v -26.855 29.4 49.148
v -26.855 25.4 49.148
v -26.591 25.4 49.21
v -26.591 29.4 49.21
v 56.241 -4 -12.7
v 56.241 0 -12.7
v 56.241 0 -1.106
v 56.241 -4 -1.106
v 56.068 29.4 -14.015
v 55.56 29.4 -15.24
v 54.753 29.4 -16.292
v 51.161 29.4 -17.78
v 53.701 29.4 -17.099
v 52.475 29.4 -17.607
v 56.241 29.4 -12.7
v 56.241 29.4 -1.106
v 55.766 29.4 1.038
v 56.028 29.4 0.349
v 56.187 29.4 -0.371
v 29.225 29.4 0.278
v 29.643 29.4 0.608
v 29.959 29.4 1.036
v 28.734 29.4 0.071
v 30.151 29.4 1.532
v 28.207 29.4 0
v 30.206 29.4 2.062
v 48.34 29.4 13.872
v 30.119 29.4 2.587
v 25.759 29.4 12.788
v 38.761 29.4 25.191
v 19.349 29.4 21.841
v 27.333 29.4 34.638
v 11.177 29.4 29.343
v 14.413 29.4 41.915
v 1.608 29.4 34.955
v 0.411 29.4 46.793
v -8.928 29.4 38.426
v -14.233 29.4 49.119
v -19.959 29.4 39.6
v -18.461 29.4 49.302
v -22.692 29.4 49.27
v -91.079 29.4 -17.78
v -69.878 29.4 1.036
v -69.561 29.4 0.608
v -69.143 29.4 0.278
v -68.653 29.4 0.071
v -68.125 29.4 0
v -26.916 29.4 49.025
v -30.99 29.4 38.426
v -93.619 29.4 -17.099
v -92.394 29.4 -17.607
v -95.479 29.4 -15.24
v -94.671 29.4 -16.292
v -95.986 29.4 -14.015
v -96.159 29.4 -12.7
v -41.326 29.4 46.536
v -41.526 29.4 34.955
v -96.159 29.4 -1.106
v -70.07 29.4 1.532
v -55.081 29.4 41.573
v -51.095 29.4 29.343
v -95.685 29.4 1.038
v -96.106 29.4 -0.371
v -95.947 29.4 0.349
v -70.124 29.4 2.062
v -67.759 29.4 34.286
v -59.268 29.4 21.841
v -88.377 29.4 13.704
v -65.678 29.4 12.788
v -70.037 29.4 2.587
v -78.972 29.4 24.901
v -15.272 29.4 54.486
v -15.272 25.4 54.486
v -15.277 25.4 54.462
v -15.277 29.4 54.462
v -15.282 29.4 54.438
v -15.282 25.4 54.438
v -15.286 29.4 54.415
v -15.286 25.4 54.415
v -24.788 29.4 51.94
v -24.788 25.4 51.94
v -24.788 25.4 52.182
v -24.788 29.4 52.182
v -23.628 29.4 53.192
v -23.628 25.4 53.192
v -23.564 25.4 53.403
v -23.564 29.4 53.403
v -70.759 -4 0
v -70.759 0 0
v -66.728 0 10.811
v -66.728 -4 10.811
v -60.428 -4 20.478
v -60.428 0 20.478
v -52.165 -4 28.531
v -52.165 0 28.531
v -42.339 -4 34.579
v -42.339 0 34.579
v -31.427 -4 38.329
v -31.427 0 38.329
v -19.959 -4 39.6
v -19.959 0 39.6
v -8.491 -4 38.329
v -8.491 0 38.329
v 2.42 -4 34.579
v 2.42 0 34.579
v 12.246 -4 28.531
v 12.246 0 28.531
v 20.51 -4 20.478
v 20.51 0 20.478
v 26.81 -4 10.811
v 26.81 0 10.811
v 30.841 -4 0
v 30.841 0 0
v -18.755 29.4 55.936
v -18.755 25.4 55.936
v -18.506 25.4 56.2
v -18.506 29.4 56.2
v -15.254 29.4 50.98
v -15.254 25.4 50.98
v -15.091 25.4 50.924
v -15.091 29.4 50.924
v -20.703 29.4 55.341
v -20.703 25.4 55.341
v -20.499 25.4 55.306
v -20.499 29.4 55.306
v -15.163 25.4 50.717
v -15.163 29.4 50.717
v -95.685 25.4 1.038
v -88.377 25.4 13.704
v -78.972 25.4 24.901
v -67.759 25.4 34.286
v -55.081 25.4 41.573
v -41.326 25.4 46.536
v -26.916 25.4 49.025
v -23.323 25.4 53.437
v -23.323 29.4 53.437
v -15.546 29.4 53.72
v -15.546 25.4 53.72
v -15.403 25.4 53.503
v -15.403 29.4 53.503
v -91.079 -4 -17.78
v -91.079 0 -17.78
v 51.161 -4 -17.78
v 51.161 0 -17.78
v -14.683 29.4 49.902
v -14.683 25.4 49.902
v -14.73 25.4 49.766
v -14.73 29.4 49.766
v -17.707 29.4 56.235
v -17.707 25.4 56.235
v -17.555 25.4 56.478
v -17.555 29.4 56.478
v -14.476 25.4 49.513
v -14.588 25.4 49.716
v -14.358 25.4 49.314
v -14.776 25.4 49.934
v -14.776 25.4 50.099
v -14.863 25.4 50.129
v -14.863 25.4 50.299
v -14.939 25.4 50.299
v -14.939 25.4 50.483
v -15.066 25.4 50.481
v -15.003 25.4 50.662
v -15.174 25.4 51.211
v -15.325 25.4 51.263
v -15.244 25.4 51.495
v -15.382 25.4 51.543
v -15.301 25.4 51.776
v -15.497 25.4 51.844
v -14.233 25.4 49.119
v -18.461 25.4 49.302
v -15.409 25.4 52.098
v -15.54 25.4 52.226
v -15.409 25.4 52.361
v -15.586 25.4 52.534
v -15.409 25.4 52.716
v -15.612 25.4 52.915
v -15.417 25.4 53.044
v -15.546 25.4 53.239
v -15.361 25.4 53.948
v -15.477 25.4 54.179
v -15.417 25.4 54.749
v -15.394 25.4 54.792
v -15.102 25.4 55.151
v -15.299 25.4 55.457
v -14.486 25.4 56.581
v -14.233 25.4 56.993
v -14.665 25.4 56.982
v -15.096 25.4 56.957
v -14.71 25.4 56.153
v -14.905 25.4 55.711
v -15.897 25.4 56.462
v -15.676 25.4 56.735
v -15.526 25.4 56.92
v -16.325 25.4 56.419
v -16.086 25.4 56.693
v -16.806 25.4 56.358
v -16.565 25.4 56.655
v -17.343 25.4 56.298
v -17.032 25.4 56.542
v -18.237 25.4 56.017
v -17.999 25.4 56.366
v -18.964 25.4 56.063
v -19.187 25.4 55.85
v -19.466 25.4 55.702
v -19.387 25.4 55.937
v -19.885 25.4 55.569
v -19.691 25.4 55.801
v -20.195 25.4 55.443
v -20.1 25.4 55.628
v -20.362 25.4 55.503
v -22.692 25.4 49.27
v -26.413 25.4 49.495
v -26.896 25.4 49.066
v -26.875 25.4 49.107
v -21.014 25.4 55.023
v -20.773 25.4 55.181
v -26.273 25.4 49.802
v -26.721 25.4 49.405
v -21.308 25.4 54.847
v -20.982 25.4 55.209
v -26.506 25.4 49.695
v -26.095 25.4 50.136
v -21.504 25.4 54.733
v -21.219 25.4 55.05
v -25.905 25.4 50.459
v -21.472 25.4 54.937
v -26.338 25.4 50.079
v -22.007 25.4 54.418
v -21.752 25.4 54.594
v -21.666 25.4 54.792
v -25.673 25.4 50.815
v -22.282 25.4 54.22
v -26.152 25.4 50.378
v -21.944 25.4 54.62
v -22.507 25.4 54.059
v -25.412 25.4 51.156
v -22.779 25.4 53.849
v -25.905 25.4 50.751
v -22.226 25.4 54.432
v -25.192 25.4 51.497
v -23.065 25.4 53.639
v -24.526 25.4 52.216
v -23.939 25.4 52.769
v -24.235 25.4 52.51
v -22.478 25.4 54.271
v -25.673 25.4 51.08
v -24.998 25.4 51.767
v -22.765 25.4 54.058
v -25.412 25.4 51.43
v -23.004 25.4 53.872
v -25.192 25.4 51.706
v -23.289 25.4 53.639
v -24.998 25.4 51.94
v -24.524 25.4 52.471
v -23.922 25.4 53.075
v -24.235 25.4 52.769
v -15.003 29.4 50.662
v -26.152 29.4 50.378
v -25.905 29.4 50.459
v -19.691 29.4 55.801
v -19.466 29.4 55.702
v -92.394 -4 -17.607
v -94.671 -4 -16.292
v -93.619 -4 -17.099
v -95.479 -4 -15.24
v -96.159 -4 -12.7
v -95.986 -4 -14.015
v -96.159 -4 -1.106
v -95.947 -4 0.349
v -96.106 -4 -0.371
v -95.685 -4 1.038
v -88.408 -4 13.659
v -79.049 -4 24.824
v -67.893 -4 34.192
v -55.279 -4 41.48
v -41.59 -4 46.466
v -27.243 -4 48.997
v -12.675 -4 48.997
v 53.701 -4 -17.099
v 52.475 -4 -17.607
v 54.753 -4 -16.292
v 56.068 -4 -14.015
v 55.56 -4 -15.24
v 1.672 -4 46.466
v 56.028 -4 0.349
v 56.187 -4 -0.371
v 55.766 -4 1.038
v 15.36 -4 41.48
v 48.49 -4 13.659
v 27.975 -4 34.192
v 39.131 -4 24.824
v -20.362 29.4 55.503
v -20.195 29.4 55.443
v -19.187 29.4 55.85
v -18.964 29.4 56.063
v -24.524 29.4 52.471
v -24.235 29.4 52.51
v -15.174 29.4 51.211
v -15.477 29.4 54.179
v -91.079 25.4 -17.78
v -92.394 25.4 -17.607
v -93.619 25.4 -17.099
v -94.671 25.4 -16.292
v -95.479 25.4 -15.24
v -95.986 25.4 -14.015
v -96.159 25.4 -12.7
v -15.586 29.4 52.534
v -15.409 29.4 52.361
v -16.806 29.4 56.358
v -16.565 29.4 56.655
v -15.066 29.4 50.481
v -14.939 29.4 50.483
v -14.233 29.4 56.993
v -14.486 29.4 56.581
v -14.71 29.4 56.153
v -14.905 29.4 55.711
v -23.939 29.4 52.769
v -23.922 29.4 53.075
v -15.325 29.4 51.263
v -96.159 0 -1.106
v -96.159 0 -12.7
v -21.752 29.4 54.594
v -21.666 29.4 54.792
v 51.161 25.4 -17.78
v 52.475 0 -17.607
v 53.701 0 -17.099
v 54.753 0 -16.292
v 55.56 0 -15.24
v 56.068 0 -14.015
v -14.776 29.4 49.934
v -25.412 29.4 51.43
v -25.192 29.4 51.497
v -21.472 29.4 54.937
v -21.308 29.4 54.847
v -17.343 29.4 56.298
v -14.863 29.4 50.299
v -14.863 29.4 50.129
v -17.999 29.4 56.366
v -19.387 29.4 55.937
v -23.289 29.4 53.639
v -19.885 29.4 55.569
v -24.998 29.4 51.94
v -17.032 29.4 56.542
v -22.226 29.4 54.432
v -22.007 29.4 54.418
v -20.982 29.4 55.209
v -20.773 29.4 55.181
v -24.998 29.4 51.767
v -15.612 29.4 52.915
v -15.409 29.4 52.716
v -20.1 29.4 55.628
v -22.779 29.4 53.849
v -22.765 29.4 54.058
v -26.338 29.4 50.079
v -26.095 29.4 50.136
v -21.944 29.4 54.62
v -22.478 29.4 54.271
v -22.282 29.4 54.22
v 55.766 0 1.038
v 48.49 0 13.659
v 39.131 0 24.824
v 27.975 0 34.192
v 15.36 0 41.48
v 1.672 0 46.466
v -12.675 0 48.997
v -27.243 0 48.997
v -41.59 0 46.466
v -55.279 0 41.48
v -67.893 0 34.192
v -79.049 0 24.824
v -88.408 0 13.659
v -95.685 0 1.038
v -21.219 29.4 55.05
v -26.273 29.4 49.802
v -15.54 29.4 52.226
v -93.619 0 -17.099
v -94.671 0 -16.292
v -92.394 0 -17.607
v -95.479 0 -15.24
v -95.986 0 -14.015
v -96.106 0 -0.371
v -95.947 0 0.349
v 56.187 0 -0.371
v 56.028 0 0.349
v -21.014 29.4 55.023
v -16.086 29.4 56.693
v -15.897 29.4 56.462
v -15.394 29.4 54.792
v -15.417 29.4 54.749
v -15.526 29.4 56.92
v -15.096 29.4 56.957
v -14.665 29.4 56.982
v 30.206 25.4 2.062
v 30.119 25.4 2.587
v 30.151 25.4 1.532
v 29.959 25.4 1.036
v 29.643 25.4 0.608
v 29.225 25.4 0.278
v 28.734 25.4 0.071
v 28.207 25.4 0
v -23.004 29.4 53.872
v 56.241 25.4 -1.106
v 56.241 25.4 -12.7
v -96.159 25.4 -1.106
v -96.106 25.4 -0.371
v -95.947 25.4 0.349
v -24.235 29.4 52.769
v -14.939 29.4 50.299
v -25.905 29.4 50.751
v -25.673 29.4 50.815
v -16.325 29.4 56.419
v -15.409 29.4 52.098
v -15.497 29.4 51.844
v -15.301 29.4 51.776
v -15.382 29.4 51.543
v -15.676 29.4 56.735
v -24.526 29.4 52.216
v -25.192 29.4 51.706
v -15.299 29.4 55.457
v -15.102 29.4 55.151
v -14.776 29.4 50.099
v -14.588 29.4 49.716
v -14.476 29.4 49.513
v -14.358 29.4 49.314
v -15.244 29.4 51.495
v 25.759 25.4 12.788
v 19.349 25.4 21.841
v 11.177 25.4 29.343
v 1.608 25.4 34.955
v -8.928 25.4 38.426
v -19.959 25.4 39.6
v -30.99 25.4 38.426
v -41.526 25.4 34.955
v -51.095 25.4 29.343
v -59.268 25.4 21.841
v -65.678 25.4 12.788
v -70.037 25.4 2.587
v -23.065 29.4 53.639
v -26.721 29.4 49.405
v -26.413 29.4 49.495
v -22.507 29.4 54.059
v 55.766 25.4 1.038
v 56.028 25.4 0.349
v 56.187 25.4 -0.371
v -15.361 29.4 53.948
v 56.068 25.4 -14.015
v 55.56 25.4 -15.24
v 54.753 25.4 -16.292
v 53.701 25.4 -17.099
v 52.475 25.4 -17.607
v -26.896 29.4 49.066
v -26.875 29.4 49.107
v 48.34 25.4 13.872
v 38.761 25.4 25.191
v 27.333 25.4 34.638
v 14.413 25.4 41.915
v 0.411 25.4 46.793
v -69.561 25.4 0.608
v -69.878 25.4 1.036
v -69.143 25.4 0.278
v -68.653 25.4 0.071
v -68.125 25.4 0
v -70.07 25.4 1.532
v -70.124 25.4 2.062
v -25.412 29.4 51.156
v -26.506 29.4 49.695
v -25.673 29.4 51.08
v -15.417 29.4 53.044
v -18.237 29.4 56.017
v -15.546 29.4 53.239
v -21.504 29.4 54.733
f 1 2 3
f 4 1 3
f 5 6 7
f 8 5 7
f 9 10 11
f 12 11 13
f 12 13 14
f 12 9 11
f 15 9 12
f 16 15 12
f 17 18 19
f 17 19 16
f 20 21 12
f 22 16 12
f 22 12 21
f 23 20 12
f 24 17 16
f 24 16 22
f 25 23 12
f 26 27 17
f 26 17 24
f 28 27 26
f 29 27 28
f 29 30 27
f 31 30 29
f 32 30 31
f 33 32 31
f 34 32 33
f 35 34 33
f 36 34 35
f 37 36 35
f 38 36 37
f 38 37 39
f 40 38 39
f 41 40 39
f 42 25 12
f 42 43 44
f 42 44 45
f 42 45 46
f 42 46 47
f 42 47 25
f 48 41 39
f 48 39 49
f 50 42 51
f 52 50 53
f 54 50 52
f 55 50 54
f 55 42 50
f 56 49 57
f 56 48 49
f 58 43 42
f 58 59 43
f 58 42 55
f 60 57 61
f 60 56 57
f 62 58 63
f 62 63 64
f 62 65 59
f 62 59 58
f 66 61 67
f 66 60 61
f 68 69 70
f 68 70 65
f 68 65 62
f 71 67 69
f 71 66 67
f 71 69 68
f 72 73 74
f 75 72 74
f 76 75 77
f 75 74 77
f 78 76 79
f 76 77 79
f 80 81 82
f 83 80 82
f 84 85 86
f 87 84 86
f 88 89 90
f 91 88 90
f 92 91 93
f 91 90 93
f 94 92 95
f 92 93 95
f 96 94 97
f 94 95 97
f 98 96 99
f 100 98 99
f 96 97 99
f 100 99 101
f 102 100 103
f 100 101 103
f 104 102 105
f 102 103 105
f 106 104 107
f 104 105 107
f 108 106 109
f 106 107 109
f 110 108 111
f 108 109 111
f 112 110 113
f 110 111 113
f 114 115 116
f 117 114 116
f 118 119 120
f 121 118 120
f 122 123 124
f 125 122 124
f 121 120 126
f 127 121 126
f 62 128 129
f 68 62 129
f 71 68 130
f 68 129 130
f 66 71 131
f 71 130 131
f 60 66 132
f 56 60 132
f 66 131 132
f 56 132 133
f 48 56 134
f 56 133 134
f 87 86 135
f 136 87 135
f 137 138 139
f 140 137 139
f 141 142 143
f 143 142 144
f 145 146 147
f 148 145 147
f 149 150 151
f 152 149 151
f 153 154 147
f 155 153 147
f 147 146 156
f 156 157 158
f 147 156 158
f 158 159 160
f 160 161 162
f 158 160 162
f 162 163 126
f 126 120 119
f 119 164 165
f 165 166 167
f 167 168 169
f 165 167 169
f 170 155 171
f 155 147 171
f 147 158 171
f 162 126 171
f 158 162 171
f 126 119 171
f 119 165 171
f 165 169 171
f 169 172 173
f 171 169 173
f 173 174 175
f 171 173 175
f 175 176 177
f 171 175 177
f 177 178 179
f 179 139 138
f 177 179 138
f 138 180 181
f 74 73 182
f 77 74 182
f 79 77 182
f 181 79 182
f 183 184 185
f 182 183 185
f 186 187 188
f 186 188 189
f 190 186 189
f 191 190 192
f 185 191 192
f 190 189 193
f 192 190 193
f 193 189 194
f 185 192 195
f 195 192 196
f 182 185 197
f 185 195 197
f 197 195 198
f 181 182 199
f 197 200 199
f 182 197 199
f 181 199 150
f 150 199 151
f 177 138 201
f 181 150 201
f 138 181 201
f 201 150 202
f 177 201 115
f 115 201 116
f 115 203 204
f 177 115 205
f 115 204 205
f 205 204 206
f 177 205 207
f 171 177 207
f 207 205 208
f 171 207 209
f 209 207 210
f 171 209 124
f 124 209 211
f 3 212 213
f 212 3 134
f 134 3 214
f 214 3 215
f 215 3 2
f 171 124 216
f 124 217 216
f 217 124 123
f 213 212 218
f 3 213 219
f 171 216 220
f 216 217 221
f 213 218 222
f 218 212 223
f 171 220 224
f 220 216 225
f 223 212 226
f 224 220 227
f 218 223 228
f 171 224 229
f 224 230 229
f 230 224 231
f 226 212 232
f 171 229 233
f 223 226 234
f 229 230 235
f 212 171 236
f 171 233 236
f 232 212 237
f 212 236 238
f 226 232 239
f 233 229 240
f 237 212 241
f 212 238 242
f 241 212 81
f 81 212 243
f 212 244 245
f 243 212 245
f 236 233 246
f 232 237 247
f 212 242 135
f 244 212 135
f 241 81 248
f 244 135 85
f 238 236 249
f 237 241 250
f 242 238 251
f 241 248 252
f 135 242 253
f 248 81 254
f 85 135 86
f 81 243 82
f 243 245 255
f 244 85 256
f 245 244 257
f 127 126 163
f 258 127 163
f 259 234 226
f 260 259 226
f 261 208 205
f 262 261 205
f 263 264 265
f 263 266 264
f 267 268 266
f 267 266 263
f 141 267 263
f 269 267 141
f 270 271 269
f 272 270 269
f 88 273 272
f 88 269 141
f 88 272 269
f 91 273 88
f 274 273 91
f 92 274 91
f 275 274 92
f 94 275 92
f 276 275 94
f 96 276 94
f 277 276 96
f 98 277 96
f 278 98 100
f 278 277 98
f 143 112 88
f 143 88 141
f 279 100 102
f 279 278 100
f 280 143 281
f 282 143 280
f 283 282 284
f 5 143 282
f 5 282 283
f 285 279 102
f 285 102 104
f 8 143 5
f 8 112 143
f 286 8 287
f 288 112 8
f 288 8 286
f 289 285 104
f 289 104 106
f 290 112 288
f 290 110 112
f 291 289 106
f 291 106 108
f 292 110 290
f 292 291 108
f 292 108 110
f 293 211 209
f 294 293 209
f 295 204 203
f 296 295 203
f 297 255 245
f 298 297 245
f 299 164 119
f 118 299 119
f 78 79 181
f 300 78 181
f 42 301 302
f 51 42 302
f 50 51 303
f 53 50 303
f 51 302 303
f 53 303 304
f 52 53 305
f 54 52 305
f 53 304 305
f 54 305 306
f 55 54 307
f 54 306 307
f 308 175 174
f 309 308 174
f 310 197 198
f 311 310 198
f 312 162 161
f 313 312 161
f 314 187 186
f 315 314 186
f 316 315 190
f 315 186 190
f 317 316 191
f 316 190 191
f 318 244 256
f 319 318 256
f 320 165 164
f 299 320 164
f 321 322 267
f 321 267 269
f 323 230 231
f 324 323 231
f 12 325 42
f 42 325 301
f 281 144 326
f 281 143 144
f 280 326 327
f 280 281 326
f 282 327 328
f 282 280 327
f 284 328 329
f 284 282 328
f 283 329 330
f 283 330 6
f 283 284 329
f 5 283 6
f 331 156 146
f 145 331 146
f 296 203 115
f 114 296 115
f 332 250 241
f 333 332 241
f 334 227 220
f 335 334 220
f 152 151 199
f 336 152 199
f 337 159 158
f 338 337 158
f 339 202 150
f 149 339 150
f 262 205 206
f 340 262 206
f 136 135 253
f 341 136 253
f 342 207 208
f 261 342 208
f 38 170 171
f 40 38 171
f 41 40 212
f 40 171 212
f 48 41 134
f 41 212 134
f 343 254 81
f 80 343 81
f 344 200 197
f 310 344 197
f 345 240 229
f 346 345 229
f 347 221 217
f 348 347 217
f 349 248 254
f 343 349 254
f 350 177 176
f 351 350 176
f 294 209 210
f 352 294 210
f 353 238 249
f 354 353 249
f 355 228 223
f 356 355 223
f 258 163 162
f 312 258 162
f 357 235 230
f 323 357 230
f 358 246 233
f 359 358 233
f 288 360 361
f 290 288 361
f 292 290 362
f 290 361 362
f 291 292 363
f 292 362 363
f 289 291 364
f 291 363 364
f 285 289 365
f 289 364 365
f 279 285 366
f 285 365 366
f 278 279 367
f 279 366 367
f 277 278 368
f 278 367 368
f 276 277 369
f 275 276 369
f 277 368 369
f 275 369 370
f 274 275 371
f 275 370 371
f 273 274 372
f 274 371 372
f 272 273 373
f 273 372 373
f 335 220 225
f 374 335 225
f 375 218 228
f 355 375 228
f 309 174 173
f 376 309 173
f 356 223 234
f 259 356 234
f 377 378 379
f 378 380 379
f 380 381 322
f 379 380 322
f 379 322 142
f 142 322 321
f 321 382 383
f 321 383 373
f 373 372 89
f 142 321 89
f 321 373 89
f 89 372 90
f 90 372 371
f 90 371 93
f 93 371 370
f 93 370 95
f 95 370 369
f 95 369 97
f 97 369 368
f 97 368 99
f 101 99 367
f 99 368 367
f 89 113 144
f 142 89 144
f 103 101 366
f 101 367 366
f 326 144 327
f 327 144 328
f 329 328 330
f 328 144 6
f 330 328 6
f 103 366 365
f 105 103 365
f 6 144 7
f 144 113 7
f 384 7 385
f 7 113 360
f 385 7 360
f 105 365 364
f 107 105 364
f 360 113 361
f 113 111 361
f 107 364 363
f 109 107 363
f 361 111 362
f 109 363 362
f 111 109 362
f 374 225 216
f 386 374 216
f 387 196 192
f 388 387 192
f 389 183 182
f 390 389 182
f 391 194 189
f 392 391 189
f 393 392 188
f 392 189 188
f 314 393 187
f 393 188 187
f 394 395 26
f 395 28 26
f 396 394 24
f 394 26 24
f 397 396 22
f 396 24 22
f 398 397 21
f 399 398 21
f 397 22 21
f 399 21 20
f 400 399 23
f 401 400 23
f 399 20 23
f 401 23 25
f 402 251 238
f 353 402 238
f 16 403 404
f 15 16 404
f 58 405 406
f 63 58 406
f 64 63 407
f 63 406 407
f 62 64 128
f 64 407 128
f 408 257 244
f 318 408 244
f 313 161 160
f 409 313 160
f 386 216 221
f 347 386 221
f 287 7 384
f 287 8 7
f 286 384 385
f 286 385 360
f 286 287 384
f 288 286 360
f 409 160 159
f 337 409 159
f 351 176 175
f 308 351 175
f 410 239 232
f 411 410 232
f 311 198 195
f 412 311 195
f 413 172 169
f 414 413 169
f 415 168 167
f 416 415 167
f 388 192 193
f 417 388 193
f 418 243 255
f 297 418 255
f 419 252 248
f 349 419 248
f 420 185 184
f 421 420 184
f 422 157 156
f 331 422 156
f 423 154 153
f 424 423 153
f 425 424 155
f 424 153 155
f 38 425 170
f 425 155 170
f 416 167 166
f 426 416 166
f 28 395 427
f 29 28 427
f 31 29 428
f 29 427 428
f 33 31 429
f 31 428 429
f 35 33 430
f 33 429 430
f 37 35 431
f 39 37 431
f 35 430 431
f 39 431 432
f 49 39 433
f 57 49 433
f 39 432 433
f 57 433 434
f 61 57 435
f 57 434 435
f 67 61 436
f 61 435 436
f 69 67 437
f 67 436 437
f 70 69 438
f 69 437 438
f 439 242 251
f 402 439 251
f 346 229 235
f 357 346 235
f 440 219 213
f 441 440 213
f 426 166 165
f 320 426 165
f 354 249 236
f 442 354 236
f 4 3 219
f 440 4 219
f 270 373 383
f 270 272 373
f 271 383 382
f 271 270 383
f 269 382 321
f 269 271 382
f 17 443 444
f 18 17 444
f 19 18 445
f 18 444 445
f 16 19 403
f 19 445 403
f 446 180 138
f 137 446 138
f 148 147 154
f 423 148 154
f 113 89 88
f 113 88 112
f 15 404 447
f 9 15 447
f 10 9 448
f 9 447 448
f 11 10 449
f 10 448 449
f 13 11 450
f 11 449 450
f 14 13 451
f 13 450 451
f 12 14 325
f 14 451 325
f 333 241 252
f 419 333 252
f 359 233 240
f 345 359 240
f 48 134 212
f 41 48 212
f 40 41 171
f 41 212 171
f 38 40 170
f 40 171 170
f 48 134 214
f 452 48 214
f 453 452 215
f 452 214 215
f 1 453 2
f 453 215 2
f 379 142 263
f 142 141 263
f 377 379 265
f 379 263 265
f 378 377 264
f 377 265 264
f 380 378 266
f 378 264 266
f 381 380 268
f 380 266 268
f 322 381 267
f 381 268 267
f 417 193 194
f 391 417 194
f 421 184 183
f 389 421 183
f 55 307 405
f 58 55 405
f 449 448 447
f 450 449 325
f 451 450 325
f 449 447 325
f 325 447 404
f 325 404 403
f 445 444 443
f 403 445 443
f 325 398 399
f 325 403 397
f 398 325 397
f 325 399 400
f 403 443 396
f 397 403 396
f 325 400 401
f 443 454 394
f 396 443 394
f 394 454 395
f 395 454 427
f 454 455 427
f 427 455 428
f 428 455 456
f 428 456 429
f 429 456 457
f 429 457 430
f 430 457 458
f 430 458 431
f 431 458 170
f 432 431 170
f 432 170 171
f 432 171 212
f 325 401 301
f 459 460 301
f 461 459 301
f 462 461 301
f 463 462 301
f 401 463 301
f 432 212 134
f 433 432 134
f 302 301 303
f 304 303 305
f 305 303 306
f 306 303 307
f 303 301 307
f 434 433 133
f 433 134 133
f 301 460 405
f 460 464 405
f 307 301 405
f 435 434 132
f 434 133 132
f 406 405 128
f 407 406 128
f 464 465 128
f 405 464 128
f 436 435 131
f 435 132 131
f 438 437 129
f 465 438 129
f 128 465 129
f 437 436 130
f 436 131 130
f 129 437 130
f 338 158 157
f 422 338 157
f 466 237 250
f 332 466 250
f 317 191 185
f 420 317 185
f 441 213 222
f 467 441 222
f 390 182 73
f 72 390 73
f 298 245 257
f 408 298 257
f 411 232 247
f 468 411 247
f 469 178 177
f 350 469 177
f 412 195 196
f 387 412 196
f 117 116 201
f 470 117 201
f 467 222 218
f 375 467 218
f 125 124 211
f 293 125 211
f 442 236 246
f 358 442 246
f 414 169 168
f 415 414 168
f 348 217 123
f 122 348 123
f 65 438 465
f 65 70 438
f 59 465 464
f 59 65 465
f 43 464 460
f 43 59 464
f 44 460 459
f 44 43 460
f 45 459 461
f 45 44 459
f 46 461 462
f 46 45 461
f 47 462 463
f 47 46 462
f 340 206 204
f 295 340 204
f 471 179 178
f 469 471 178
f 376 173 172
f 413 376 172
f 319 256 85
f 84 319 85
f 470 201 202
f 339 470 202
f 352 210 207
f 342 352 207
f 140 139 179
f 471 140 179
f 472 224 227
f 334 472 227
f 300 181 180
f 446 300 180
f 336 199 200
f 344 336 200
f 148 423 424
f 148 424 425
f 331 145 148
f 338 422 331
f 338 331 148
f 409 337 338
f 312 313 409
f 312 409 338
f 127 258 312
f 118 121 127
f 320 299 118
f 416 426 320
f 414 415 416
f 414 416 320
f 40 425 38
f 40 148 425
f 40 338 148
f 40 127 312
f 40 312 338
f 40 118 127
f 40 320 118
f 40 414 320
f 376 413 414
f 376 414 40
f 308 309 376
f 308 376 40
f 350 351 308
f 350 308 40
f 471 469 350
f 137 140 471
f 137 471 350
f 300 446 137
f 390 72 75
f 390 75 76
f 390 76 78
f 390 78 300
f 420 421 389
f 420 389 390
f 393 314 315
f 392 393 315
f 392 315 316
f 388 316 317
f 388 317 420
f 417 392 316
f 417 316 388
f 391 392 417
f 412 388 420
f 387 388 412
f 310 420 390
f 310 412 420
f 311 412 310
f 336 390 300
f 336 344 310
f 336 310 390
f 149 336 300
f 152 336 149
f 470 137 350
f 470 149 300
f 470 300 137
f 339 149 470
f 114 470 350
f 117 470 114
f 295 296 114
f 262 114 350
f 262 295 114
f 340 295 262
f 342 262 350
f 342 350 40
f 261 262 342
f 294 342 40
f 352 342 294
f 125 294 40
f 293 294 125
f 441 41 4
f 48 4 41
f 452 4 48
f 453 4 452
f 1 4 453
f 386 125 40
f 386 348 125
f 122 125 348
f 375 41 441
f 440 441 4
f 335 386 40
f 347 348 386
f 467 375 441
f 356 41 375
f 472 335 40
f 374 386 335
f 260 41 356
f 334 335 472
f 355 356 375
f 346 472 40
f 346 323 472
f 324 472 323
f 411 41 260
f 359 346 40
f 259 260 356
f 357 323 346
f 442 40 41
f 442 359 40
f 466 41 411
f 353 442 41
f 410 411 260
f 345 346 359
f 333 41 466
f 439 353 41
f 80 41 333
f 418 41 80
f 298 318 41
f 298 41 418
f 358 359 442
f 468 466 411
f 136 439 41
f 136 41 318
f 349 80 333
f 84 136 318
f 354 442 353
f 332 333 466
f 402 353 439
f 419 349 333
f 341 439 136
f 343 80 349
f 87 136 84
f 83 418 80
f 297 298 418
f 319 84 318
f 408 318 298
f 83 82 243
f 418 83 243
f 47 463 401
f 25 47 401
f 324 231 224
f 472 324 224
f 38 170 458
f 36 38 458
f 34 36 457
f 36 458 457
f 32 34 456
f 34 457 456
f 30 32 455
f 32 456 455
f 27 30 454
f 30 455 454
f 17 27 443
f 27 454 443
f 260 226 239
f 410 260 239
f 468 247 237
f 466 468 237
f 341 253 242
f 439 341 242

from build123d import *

# Parameters (mm, degrees)
F0_W     = 25.4
F0_H     = 17.78
F0_W_2   = 101.6
F1_DEPTH = 4
F2_R     = 5.08
F5_DEPTH = 4
F6_DEPTH = 4
F7_R     = 2


with BuildPart() as f1:
    # F0 (on Front) → F1 (new body)
    with BuildSketch(Plane.XZ):
        with BuildLine():
            Line((-96.1593091488, 0), (-70.7593091488, 0))
            ThreePointArc((-70.7593091488, 0), (-19.9593091488, 39.6002162648), (30.8406908512, 0))
            Line((30.8406908512, 0), (56.2406908512, 0))
            ThreePointArc((56.2406908512, 0), (-19.9593091488, 49.3151322007), (-96.1593091488, 0))
        make_face()
        with Locations((-83.4593091488, -8.89)):
            Rectangle(F0_W, F0_H)
        with Locations((-19.9593091488, -8.89)):
            Rectangle(F0_W_2, F0_H)
        with Locations((43.5406908512, -8.89)):
            Rectangle(F0_W, F0_H)
    extrude(amount=F1_DEPTH)

    # F2
    f2_edges = [f1.edges().sort_by_distance(p)[0] for p in [
        (-96.159309, -2, -17.78),
        (-96.159309, -2, 0),
        (56.240691, -2, 0),
        (56.240691, -2, -17.78),
    ]]
    fillet(f2_edges, radius=F2_R)


with BuildPart() as f5:
    # F4 (on offset) → F5 (new body)
    with BuildSketch(Plane(origin=(0, 25.4, 0), x_dir=(-1, 0, 0), z_dir=(0, 1, 0))):
        with BuildLine():
            ThreePointArc((14.2333489069, 49.1186406291), (-27.3325756719, 34.6377995621), (-55.7661369292, 1.0378972062))
            ThreePointArc((-55.7661369292, 1.0378972062), (-56.1206336975, -0.0081012275), (-56.2406908512, -1.1059932814))
            Line((-56.2406908512, -1.1059932814), (-56.2406908512, -12.7))
            ThreePointArc((-56.2406908512, -12.7), (-54.7527932996, -16.2921024484), (-51.1606908512, -17.78))
            Line((-51.1606908512, -17.78), (91.0793091488, -17.78))
            ThreePointArc((91.0793091488, -17.78), (94.6714115972, -16.2921024484), (96.1593091488, -12.7))
            Line((96.1593091488, -12.7), (96.1593091488, -1.1059932814))
            ThreePointArc((96.1593091488, -1.1059932814), (96.039251995, -0.0081012275), (95.6847552268, 1.0378972062))
            ThreePointArc((95.6847552268, 1.0378972062), (67.7588008858, 34.2863701139), (26.9164722002, 49.024893245))
            ThreePointArc((26.9164722002, 49.024893245), (20.5766925245, 49.3128505354), (14.2333489069, 49.1186406291))
        make_face()
        with BuildLine():
            Line((70.7593091488, 0), (-30.8406908512, 0))
            ThreePointArc((-30.8406908512, 0), (19.9593091488, 39.6002162648), (70.7593091488, 0))
        make_face(mode=Mode.SUBTRACT)
    extrude(amount=F5_DEPTH)

    # F7
    f7_edges = [f5.edges().sort_by_distance(p)[0] for p in [
        (30.840691, 27.4, 0),
        (-70.759309, 27.4, 0),
    ]]
    fillet(f7_edges, radius=F7_R)


with BuildPart() as f6:
    # F4 (on offset) → F6 (new body)
    with BuildSketch(Plane(origin=(0, 25.4, 0), x_dir=(-1, 0, 0), z_dir=(0, 1, 0))):
        with BuildLine():
            ThreePointArc((14.587919324, 49.7164839897), (14.4179129471, 49.4132453619), (14.2333489069, 49.1186406291))
            ThreePointArc((14.2333489069, 49.1186406291), (20.5766925245, 49.3128505354), (26.9164722002, 49.024893245))
            ThreePointArc((26.9164722002, 49.024893245), (26.8857831581, 49.08646559), (26.8547988816, 49.1478898978))
            Line((26.8547988816, 49.1478898978), (26.5911761671, 49.2095798254))
            Line((26.5911761671, 49.2095798254), (26.7208667986, 49.4053309815))
            Line((26.7208667986, 49.4053309815), (26.4132608323, 49.4949472972))
            Line((26.4132608323, 49.4949472972), (26.5055205673, 49.6949665248))
            Line((26.5055205673, 49.6949665248), (26.2731513655, 49.8021478255))
            Line((26.2731513655, 49.8021478255), (26.3379376774, 50.0790024769))
            Line((26.3379376774, 50.0790024769), (26.0950929247, 50.1358301871))
            Line((26.0950929247, 50.1358301871), (26.1518425157, 50.3783411094))
            Line((26.1518425157, 50.3783411094), (25.9053820797, 50.4591504757))
            Line((25.9053820797, 50.4591504757), (25.9053820797, 50.7511711684))
            Line((25.9053820797, 50.7511711684), (25.6734836565, 50.8145170583))
            Line((25.6734836565, 50.8145170583), (25.6734836565, 51.0803319296))
            Line((25.6734836565, 51.0803319296), (25.4115723416, 51.15599962))
            Line((25.4115723416, 51.15599962), (25.4115723416, 51.4298838594))
            Line((25.4115723416, 51.4298838594), (25.1922954826, 51.4965188726))
            Line((25.1922954826, 51.4965188726), (25.1922954826, 51.7063245174))
            Line((25.1922954826, 51.7063245174), (24.9980435381, 51.7674505416))
            Line((24.9980435381, 51.7674505416), (24.9980435381, 51.9400127204))
            Line((24.9980435381, 51.9400127204), (24.7877165675, 51.9400127204))
            Line((24.7877165675, 51.9400127204), (24.7877165675, 52.1821073611))
            Line((24.7877165675, 52.1821073611), (24.525700137, 52.2157475352))
            Line((24.525700137, 52.2157475352), (24.5238746665, 52.4709833554))
            Line((24.5238746665, 52.4709833554), (24.2354683578, 52.5100119412))
            Line((24.2354683578, 52.5100119412), (24.2354683578, 52.7694435698))
            Line((24.2354683578, 52.7694435698), (23.9391885698, 52.7694435698))
            Line((23.9391885698, 52.7694435698), (23.9218927202, 53.0751949188))
            Line((23.9218927202, 53.0751949188), (23.6284695566, 53.1915194753))
            Line((23.6284695566, 53.1915194753), (23.5636002435, 53.4027072483))
            Line((23.5636002435, 53.4027072483), (23.3228887181, 53.4366453867))
            Line((23.3228887181, 53.4366453867), (23.2888327005, 53.6393353656))
            Line((23.2888327005, 53.6393353656), (23.0650053006, 53.6393353656))
            Line((23.0650053006, 53.6393353656), (23.0043883839, 53.8719460216))
            Line((23.0043883839, 53.8719460216), (22.779410705, 53.848657757))
            Line((22.779410705, 53.848657757), (22.765069328, 54.0584802903))
            Line((22.765069328, 54.0584802903), (22.506762296, 54.0590807796))
            Line((22.506762296, 54.0590807796), (22.4784466394, 54.2714518254))
            Line((22.4784466394, 54.2714518254), (22.2824197263, 54.219558835))
            Line((22.2824197263, 54.219558835), (22.2260868329, 54.4323575793))
            Line((22.2260868329, 54.4323575793), (22.0073144883, 54.4176995754))
            Line((22.0073144883, 54.4176995754), (21.9442695379, 54.6199344099))
            Line((21.9442695379, 54.6199344099), (21.7523249884, 54.5943422397))
            Line((21.7523249884, 54.5943422397), (21.6658897698, 54.7918751836))
            Line((21.6658897698, 54.7918751836), (21.5037744492, 54.7329224646))
            Line((21.5037744492, 54.7329224646), (21.4721327832, 54.9371909063))
            Line((21.4721327832, 54.9371909063), (21.3080905378, 54.8467300832))
            Line((21.3080905378, 54.8467300832), (21.2191381366, 55.0500156185))
            Line((21.2191381366, 55.0500156185), (21.0135207493, 55.0226004344))
            Line((21.0135207493, 55.0226004344), (20.9822189555, 55.2088981982))
            Line((20.9822189555, 55.2088981982), (20.7728101002, 55.1809774937))
            Line((20.7728101002, 55.1809774937), (20.7028793185, 55.3407923631))
            Line((20.7028793185, 55.3407923631), (20.4985261605, 55.3064568978))
            Line((20.4985261605, 55.3064568978), (20.3615967184, 55.5033795536))
            Line((20.3615967184, 55.5033795536), (20.1945714653, 55.4427914321))
            Line((20.1945714653, 55.4427914321), (20.0995933264, 55.6278303266))
            Line((20.0995933264, 55.6278303266), (19.8850780725, 55.5688813329))
            Line((19.8850780725, 55.5688813329), (19.6910295635, 55.8005906641))
            Line((19.6910295635, 55.8005906641), (19.4658418426, 55.7020544428))
            Line((19.4658418426, 55.7020544428), (19.3872693926, 55.9373237193))
            Line((19.3872693926, 55.9373237193), (19.1870768637, 55.8497247362))
            Line((19.1870768637, 55.8497247362), (18.9639665186, 56.0625977814))
            Line((18.9639665186, 56.0625977814), (18.755344674, 55.9364333749))
            Line((18.755344674, 55.9364333749), (18.5060612857, 56.1999604106))
            Line((18.5060612857, 56.1999604106), (18.2371921837, 56.0165606439))
            Line((18.2371921837, 56.0165606439), (17.9991510693, 56.3655354645))
            Line((17.9991510693, 56.3655354645), (17.7067328214, 56.2351753163))
            Line((17.7067328214, 56.2351753163), (17.5552275032, 56.4777329564))
            Line((17.5552275032, 56.4777329564), (17.3433367163, 56.2978945673))
            Line((17.3433367163, 56.2978945673), (17.0317348093, 56.5418377519))
            Line((17.0317348093, 56.5418377519), (16.8055985123, 56.3584342599))
            Line((16.8055985123, 56.3584342599), (16.565402307, 56.6545959079))
            Line((16.565402307, 56.6545959079), (16.324840486, 56.4189776778))
            Line((16.324840486, 56.4189776778), (16.0862412304, 56.6931851208))
            Line((16.0862412304, 56.6931851208), (15.8974975348, 56.4617104828))
            Line((15.8974975348, 56.4617104828), (15.6760702867, 56.7347300278))
            Line((15.6760702867, 56.7347300278), (15.5257509735, 56.92007357))
            ThreePointArc((15.5257509735, 56.92007357), (14.8803713379, 56.9710291346), (14.2333489069, 56.9927849924))
            ThreePointArc((14.2333489069, 56.9927849924), (14.6015182552, 56.3691102132), (14.904617976, 55.7113492698))
            Line((14.904617976, 55.7113492698), (15.299375169, 55.4569363594))
            Line((15.299375169, 55.4569363594), (15.102394042, 55.1512926064))
            Line((15.102394042, 55.1512926064), (15.3938381916, 54.7919423014))
            Line((15.3938381916, 54.7919423014), (15.41741658, 54.7486878932))
            Line((15.41741658, 54.7486878932), (15.2720850005, 54.4861028494))
            ThreePointArc((15.2720850005, 54.4861028494), (15.2792961546, 54.4503699988), (15.2863247941, 54.4146008))
            Line((15.2863247941, 54.4146008), (15.4771834803, 54.179272257))
            Line((15.4771834803, 54.179272257), (15.3607955439, 53.9484339146))
            Line((15.3607955439, 53.9484339146), (15.5460399313, 53.7200277958))
            Line((15.5460399313, 53.7200277958), (15.4028055927, 53.5028686214))
            Line((15.4028055927, 53.5028686214), (15.5460399313, 53.2394908369))
            Line((15.5460399313, 53.2394908369), (15.4168100252, 53.0435639385))
            Line((15.4168100252, 53.0435639385), (15.6122156124, 52.9146778799))
            Line((15.6122156124, 52.9146778799), (15.4087463253, 52.7162426213))
            Line((15.4087463253, 52.7162426213), (15.5863766983, 52.5341060109))
            Line((15.5863766983, 52.5341060109), (15.4087463253, 52.3608703865))
            Line((15.4087463253, 52.3608703865), (15.5400016147, 52.2262853316))
            Line((15.5400016147, 52.2262853316), (15.4087463253, 52.0982774261))
            Line((15.4087463253, 52.0982774261), (15.4971601441, 51.8436096609))
            Line((15.4971601441, 51.8436096609), (15.3011284751, 51.7755527222))
            Line((15.3011284751, 51.7755527222), (15.3819940641, 51.5426269297))
            Line((15.3819940641, 51.5426269297), (15.2441149493, 51.4947589985))
            Line((15.2441149493, 51.4947589985), (15.3246454927, 51.2627982734))
            Line((15.3246454927, 51.2627982734), (15.1743145191, 51.2106073907))
            Line((15.1743145191, 51.2106073907), (15.2542428014, 50.9803814227))
            Line((15.2542428014, 50.9803814227), (15.0911179445, 50.9237488468))
            Line((15.0911179445, 50.9237488468), (15.1629368797, 50.7168810973))
            Line((15.1629368797, 50.7168810973), (15.0034722587, 50.6615192571))
            Line((15.0034722587, 50.6615192571), (15.0661312526, 50.4810358649))
            Line((15.0661312526, 50.4810358649), (14.9388080463, 50.4826270044))
            Line((14.9388080463, 50.4826270044), (14.9388080463, 50.2994172275))
            Line((14.9388080463, 50.2994172275), (14.8633962262, 50.2994172275))
            Line((14.8633962262, 50.2994172275), (14.8633962262, 50.1290969551))
            Line((14.8633962262, 50.1290969551), (14.7757533162, 50.098669687))
            Line((14.7757533162, 50.098669687), (14.7757533162, 49.9342381954))
            Line((14.7757533162, 49.9342381954), (14.6825777973, 49.9018901538))
            Line((14.6825777973, 49.9018901538), (14.7298402296, 49.7657551224))
            Line((14.7298402296, 49.7657551224), (14.587919324, 49.7164839897))
        make_face()
    extrude(amount=F6_DEPTH)


solid = Compound([f1.part, f5.part, f6.part])
